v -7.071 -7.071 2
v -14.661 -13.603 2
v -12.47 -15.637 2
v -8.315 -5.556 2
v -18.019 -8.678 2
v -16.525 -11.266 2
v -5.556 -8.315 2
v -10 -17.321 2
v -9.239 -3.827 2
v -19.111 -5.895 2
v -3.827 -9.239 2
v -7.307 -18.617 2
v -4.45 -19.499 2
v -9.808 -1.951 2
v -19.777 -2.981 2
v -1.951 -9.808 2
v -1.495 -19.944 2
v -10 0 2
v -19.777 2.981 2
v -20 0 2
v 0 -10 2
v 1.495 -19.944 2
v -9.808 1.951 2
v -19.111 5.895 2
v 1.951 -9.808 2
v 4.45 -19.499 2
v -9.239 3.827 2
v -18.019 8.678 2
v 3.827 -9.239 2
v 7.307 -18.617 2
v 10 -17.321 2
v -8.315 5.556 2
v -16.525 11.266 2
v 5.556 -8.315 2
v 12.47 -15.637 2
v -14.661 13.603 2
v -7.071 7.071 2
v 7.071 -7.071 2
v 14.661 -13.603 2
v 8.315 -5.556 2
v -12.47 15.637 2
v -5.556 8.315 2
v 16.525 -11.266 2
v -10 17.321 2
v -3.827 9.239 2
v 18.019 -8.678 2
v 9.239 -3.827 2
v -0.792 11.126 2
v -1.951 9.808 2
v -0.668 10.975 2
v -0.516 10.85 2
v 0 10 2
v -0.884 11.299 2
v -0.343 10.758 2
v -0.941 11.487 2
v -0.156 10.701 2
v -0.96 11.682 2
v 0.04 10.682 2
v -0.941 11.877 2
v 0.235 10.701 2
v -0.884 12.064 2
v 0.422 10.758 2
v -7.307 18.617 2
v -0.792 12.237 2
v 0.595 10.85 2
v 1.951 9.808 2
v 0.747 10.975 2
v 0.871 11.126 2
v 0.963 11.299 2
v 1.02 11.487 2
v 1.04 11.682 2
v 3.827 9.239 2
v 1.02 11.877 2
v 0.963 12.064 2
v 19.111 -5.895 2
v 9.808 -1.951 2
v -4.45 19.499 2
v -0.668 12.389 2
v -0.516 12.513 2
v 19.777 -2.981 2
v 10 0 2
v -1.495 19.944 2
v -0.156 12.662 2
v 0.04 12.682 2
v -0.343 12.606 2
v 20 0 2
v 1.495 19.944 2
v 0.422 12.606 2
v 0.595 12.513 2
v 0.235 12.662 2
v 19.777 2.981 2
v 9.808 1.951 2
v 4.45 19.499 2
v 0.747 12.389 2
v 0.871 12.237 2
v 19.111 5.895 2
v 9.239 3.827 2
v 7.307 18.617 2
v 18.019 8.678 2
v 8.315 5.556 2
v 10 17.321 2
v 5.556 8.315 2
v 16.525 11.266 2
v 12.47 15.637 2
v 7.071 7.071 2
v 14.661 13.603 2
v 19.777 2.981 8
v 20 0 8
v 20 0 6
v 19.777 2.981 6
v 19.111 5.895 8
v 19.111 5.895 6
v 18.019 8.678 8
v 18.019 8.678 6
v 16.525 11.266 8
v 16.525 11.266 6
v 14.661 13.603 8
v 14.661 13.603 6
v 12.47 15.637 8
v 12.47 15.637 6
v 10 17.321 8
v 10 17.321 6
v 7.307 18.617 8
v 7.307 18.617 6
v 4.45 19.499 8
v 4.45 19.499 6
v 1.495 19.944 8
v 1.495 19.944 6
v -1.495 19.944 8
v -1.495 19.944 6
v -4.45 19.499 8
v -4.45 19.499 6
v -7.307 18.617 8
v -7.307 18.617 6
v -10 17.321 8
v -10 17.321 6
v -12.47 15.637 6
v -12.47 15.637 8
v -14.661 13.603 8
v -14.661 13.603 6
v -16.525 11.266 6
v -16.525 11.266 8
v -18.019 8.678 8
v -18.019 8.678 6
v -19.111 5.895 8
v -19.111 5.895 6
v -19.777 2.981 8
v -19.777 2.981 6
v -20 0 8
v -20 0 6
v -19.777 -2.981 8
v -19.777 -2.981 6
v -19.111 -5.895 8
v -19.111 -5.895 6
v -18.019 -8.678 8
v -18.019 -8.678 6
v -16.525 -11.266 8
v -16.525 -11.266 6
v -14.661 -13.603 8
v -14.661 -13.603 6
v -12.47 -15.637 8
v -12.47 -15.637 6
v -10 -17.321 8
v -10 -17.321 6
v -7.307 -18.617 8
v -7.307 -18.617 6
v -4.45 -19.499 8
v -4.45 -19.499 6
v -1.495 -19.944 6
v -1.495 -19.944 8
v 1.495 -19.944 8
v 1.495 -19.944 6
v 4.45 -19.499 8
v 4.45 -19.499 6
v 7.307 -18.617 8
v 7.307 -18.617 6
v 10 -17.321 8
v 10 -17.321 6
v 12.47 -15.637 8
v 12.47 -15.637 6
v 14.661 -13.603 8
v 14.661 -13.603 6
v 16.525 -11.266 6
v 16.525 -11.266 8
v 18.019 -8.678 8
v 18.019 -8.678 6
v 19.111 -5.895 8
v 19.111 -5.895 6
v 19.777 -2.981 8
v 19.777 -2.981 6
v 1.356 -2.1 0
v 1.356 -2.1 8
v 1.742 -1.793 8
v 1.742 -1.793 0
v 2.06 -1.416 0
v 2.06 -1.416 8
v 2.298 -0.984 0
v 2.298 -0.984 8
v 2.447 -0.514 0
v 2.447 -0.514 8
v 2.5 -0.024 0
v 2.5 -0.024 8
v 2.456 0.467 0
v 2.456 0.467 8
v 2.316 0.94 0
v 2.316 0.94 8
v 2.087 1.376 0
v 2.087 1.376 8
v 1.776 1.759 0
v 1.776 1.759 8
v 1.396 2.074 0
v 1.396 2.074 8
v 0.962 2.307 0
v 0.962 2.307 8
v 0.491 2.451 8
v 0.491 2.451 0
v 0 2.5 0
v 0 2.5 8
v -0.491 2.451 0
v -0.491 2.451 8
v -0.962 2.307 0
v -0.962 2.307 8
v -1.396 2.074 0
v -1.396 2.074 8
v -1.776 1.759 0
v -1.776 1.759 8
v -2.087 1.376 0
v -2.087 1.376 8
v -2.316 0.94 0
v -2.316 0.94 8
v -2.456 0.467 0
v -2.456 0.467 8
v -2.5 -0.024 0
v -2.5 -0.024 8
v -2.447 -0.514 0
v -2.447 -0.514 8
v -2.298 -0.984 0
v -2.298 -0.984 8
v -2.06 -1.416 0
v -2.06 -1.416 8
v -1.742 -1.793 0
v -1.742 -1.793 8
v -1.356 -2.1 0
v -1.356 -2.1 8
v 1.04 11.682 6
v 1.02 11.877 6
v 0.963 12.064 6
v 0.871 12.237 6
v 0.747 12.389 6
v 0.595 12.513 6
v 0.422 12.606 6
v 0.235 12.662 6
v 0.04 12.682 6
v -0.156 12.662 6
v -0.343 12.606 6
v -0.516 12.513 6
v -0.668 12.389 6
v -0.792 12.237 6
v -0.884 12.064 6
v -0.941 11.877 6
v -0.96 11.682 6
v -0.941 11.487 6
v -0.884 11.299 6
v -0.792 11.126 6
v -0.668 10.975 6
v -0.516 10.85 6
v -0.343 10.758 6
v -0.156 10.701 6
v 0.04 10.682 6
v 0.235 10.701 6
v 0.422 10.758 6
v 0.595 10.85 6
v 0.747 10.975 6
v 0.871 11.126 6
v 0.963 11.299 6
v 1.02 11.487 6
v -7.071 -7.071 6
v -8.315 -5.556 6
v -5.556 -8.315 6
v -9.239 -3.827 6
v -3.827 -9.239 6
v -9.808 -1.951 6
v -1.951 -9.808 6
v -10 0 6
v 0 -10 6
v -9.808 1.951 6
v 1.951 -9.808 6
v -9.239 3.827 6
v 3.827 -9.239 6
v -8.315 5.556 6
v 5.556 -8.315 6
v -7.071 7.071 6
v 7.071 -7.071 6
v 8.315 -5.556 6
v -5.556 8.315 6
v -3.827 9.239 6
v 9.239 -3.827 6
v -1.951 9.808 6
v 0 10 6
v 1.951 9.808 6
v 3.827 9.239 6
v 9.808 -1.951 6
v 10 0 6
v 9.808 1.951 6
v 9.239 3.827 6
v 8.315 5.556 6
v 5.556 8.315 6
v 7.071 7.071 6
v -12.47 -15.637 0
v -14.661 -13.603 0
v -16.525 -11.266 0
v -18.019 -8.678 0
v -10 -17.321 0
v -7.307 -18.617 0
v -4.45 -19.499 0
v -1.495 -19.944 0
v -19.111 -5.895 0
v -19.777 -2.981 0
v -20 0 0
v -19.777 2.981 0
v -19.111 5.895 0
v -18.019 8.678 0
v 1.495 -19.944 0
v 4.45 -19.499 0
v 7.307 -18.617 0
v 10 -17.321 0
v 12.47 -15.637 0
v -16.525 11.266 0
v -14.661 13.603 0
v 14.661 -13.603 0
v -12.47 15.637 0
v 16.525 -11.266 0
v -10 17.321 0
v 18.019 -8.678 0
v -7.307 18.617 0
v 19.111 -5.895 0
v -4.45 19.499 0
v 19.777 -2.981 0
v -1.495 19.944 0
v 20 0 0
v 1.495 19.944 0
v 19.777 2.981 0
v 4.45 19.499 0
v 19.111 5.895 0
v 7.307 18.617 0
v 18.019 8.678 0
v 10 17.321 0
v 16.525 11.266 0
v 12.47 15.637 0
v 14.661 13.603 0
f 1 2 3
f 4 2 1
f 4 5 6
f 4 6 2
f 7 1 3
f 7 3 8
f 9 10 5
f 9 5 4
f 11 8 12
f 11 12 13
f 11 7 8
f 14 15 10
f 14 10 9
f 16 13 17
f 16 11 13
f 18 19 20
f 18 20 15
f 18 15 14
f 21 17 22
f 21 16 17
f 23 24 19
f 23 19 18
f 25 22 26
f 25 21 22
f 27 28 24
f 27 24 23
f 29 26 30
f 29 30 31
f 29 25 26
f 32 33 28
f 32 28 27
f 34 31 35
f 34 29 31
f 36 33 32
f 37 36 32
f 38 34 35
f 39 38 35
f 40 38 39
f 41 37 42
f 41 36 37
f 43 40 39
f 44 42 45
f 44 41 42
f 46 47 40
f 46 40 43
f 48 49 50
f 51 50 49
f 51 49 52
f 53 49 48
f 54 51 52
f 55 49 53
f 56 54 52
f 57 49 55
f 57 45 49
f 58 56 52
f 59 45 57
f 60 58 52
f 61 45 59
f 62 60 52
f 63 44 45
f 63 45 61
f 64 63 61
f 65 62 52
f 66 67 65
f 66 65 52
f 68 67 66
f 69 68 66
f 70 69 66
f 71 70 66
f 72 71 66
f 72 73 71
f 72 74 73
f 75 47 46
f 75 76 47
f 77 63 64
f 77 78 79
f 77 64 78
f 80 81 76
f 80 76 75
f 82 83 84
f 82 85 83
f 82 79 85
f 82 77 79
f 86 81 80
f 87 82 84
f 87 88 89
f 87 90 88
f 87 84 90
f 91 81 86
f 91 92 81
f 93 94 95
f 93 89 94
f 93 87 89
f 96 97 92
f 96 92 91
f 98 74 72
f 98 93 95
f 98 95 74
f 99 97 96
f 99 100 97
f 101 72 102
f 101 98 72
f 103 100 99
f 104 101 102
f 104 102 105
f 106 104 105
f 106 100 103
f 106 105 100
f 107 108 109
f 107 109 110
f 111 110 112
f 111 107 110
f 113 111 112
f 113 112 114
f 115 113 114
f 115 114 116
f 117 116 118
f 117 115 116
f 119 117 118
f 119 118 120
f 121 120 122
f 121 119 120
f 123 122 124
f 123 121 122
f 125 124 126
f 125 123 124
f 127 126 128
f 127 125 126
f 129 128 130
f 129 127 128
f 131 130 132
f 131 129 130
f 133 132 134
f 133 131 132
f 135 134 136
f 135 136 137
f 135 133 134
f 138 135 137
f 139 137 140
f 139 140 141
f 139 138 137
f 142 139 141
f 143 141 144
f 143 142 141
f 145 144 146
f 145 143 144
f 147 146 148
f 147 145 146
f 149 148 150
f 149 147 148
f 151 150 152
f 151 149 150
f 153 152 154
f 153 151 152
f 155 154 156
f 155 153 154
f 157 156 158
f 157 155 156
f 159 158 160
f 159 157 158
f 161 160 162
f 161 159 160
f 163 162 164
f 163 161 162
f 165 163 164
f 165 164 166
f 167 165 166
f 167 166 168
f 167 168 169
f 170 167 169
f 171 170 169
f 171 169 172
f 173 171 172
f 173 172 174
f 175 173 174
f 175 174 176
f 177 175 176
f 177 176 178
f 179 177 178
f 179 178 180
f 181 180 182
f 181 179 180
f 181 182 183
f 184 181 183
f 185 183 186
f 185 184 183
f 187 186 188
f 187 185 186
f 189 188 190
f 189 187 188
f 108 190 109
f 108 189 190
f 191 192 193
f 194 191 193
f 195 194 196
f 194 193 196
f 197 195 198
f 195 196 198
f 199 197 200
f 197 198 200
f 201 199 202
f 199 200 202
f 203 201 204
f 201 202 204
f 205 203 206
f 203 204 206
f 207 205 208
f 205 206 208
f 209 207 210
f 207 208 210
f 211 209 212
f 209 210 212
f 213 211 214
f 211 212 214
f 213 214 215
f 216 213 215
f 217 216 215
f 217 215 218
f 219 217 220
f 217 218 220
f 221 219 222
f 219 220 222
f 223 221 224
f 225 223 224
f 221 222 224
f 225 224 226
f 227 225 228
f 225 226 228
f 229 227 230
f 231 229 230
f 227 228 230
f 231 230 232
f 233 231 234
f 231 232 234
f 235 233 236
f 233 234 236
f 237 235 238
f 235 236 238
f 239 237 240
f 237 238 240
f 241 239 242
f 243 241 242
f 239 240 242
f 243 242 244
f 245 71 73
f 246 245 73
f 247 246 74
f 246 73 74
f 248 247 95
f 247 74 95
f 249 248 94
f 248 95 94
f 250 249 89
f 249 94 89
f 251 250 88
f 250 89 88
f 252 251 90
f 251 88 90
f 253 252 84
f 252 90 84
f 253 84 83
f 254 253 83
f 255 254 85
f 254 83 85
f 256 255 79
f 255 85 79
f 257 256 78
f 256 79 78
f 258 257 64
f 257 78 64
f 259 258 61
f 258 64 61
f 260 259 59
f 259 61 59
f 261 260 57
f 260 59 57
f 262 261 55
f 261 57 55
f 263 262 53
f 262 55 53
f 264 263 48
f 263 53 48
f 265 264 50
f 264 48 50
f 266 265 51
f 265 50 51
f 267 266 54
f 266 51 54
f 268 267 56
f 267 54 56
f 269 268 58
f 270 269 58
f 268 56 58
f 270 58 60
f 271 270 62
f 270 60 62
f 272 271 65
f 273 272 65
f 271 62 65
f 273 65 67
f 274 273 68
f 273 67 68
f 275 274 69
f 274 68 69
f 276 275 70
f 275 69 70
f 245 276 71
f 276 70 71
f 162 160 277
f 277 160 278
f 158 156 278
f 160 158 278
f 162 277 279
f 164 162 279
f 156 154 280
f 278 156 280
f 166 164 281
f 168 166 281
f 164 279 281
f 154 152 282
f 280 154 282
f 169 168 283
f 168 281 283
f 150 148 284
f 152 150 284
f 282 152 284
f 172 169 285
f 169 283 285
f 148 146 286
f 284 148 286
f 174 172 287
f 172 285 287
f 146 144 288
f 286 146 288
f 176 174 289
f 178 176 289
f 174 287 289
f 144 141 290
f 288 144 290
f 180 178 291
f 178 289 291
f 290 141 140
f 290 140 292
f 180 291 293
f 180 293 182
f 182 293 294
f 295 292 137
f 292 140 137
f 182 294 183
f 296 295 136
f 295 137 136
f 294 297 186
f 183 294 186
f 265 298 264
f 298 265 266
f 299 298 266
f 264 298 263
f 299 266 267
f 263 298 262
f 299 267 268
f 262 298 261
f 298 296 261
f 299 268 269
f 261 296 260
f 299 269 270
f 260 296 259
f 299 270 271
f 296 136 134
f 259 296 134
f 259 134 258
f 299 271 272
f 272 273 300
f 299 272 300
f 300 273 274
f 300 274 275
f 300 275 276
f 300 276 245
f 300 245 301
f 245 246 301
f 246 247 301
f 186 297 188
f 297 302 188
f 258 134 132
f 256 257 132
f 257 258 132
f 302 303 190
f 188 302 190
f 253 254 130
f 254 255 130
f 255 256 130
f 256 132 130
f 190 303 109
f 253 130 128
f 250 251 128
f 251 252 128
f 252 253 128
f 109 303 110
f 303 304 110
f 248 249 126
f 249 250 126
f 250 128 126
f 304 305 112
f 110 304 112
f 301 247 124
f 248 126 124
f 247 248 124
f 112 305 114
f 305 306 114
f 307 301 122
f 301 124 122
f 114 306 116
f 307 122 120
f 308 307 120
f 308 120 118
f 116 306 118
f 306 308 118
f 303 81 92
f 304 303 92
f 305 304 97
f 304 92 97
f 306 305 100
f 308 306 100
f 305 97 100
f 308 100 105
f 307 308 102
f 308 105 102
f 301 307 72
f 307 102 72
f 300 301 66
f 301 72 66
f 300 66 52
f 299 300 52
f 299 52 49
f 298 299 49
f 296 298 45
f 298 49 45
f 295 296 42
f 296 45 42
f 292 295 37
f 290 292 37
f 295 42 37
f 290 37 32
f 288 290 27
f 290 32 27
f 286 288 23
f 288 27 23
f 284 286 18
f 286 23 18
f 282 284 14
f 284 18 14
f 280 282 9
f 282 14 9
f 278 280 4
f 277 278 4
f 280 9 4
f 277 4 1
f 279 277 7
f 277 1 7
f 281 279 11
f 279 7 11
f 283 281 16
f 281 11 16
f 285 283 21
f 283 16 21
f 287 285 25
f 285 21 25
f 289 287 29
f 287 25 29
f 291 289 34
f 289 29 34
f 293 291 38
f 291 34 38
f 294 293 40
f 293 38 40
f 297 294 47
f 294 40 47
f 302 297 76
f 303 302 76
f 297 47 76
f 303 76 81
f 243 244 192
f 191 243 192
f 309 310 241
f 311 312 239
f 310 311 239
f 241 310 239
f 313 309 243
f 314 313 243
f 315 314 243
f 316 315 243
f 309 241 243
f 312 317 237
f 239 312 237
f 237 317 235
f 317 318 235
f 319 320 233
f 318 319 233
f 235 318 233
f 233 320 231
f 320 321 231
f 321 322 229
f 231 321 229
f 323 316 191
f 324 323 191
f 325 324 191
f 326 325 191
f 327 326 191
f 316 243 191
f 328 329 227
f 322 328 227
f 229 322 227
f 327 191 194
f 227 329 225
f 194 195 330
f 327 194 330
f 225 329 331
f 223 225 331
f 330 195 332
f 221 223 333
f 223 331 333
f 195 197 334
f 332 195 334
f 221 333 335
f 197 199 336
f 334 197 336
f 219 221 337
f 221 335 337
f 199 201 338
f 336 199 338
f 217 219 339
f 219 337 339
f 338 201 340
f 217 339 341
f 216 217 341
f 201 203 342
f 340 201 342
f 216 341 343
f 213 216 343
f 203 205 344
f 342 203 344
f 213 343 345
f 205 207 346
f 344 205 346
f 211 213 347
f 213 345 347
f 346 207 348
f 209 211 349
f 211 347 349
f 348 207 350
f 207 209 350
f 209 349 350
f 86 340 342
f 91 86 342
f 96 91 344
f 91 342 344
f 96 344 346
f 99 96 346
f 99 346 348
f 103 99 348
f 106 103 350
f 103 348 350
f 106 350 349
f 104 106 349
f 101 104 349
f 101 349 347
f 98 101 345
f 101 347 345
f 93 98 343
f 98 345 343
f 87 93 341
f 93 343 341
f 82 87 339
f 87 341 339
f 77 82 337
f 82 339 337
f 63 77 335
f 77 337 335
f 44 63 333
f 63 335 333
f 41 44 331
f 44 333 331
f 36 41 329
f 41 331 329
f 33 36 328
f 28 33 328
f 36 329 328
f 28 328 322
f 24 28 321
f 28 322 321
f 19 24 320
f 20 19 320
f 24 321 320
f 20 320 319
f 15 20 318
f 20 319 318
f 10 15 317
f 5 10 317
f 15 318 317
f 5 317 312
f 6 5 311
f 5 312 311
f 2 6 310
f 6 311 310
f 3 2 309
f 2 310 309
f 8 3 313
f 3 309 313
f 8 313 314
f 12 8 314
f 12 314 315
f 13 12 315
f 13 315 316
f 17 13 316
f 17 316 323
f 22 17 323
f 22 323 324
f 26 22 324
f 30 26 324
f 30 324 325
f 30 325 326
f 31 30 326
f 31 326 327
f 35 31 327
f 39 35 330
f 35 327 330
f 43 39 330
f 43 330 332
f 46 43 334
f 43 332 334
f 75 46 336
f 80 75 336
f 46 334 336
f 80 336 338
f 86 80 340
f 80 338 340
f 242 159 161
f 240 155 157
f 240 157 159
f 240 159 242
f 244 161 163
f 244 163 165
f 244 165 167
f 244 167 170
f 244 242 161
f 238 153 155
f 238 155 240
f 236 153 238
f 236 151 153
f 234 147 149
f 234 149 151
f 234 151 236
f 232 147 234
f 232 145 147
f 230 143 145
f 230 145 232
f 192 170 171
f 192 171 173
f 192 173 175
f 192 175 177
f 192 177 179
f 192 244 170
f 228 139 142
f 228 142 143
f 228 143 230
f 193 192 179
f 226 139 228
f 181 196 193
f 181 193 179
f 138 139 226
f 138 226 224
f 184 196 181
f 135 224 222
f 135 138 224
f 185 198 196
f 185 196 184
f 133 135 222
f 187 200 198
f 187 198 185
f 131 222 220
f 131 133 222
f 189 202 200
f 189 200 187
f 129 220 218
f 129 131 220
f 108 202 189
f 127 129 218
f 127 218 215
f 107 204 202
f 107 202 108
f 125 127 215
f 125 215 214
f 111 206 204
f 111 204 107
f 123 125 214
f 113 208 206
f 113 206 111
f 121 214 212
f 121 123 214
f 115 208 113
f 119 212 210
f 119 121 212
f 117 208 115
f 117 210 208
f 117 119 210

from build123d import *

# Parameters (mm, degrees)
SKETCH_1_R          = 20
EXTRUDE_1_DEPTH     = 2
SKETCH_2_R          = 10
EXTRUDE_2_DEPTH     = 4
SKETCH_3_R          = 1
EXTRUDE_3_DEPTH     = 4
CUT_EXTRUDE_1_DEPTH = 8


with BuildPart() as part:
    # 草图1 → 凸台-拉伸1 (new body)
    with BuildSketch(Plane.XY):
        Circle(SKETCH_1_R)
    extrude_1 = extrude(amount=EXTRUDE_1_DEPTH)

    # 草图2 → 凸台-拉伸2 (add)
    with BuildSketch(Plane.XY.offset(2)):
        Circle(SKETCH_2_R)
    extrude(amount=EXTRUDE_2_DEPTH)

    # 草图3 → 凸台-拉伸3 (add)
    with BuildSketch(Plane.XY.offset(2)):
        with Locations((0.039532003, 11.681707008)):
            Circle(SKETCH_3_R)
    extrude(amount=EXTRUDE_3_DEPTH)

    # 镜向2: 凸台-拉伸1 across plane
    add(extrude_1.mirror(Plane.XY.offset(4)))

    # 草图4 → 切除-拉伸1 (cut)
    with BuildSketch(Plane.XY.offset(8)):
        with BuildLine():
            Line((-1.356465997, -2.1), (1.356465997, -2.1))
            ThreePointArc((1.356465997, -2.1), (0, 2.5), (-1.356465997, -2.1))
        make_face()
    extrude(amount=-CUT_EXTRUDE_1_DEPTH, mode=Mode.SUBTRACT)


solid = part.part
